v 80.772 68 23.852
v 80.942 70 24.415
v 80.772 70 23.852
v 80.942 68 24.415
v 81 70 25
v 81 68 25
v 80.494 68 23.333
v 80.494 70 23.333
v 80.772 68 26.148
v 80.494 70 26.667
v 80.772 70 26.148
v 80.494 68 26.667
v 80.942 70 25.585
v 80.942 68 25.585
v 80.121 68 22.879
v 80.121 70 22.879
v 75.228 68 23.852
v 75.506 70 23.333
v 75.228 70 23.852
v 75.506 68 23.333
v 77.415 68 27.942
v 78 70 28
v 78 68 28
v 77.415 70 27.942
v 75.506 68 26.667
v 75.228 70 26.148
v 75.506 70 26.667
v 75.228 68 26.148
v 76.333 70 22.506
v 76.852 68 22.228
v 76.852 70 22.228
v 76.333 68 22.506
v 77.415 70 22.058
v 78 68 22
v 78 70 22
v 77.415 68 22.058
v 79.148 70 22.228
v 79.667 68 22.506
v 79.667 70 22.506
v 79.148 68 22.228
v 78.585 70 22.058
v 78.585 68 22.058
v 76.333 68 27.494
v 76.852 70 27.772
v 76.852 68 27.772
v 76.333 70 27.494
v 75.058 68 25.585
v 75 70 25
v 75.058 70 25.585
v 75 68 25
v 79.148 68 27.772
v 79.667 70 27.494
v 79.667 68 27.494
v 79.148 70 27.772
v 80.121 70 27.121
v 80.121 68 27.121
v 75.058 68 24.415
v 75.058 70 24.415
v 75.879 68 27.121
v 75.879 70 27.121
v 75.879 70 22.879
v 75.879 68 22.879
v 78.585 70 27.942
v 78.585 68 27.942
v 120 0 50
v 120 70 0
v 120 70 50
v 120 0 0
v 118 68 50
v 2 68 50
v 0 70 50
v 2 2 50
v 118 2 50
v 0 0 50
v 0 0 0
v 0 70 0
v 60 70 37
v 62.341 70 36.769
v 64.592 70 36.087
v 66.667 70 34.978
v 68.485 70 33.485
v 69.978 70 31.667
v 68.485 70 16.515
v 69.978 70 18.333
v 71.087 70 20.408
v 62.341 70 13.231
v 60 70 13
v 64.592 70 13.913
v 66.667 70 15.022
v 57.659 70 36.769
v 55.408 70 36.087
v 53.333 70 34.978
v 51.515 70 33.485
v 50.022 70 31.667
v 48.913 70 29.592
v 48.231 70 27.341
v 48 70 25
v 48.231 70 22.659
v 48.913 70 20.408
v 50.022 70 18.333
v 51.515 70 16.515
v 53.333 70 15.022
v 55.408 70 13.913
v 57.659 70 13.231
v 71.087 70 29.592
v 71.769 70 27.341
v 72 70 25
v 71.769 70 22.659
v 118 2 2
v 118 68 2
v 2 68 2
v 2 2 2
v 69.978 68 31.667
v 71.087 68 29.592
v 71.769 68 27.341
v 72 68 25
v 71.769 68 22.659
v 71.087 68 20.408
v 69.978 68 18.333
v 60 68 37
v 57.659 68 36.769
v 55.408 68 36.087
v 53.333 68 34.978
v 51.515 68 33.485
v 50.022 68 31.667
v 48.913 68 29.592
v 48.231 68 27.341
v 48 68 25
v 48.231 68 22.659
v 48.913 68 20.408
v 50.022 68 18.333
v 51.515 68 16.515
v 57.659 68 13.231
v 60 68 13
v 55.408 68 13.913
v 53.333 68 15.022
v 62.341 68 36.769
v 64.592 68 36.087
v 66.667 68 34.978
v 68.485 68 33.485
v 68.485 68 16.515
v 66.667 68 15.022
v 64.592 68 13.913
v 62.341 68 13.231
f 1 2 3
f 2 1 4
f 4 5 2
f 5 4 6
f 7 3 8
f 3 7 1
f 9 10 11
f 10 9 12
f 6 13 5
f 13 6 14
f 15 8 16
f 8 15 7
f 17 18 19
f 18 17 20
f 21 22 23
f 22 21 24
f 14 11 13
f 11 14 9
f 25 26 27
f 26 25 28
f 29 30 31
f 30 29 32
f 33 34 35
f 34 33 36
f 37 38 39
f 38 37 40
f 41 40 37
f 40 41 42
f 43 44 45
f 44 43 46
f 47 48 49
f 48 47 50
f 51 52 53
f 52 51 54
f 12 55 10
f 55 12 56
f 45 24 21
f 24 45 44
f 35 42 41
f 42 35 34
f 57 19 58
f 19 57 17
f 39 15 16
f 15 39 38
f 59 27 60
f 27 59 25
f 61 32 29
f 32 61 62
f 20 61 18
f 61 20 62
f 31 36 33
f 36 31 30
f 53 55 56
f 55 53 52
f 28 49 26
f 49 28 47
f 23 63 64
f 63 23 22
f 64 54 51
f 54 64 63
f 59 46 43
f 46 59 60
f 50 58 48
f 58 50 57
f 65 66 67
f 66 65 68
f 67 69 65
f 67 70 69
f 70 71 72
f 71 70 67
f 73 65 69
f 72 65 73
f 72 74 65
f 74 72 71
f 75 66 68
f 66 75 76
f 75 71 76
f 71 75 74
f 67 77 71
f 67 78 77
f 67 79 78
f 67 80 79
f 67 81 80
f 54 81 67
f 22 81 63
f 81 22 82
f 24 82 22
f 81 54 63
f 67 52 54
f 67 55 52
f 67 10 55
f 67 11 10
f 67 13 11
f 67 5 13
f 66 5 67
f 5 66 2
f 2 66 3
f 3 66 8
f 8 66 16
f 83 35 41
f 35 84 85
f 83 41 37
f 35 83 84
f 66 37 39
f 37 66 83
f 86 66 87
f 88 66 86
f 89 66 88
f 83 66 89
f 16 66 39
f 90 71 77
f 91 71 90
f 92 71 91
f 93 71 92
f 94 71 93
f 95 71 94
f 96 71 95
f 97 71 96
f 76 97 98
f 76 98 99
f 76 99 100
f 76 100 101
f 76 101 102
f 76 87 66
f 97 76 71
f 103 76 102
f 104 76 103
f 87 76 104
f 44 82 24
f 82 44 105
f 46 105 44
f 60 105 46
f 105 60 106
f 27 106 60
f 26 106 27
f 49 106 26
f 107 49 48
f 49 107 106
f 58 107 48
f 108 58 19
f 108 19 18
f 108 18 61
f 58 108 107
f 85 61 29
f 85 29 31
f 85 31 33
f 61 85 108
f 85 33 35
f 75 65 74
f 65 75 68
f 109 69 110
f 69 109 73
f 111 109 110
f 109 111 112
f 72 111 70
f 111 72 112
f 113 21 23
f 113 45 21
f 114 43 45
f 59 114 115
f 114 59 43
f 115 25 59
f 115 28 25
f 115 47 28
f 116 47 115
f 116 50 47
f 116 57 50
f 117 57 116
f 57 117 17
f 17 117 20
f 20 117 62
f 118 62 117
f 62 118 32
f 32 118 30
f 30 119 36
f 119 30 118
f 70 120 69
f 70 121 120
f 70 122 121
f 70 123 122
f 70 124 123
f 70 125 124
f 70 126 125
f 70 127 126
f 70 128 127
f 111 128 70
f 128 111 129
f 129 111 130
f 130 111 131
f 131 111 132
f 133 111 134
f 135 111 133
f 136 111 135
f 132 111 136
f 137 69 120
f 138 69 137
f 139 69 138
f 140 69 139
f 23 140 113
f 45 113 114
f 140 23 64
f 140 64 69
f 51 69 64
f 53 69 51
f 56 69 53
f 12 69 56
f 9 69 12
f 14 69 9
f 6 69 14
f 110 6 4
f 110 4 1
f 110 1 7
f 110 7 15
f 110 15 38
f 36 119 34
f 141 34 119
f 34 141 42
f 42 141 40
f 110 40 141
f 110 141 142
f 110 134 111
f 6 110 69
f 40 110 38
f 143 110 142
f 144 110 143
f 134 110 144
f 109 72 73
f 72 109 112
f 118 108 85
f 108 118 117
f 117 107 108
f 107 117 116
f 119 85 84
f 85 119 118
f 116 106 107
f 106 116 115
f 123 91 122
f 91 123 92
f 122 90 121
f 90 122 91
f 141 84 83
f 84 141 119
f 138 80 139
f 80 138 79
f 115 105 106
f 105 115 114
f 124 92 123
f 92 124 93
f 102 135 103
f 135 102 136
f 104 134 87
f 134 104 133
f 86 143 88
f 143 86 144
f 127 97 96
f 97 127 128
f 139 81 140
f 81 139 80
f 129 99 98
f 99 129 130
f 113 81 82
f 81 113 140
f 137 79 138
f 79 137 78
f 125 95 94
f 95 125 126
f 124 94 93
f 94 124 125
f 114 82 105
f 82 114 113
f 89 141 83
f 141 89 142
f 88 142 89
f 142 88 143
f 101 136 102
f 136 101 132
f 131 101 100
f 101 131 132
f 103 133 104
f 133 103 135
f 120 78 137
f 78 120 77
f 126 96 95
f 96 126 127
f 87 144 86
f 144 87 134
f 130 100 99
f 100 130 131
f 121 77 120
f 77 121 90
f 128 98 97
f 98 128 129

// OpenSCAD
$fn = 32;

// ----------------------------------------------------------------------
// Vent box: roundvent enclosure
// ----------------------------------------------------------------------

// --- parameters (mm) ---
box_l = 120;              // box length, X
box_w = 70;               // box width, Y
box_h = 50;               // box height, Z
wall_t = 2;               // shell wall thickness
vent_d = 24;              // central vent diameter
ring_d = 6;               // ring hole diameter
n_ring = 6;               // holes in the ring
ring_r = 18;              // ring radius

ring_step = 360 / n_ring;  // ring hole angular step

difference() {
  cube([box_l, box_w, box_h]);
  translate([wall_t, wall_t, wall_t])
    cube([box_l - 2 * wall_t, box_w - 2 * wall_t, box_h]);
  translate([box_l / 2, box_w - wall_t - 1, box_h / 2])
    rotate([-90, 0, 0]) cylinder(h = wall_t + 2, d = vent_d);
  for (i = [0 : n_ring - 1])
    translate([box_l / 2, box_w - wall_t - 1, box_h / 2])
      rotate([0, 0, i * ring_step])
        translate([ring_r, 0, 0]) rotate([-90, 0, 0])
          cylinder(h = wall_t + 2, d = ring_d);
}
